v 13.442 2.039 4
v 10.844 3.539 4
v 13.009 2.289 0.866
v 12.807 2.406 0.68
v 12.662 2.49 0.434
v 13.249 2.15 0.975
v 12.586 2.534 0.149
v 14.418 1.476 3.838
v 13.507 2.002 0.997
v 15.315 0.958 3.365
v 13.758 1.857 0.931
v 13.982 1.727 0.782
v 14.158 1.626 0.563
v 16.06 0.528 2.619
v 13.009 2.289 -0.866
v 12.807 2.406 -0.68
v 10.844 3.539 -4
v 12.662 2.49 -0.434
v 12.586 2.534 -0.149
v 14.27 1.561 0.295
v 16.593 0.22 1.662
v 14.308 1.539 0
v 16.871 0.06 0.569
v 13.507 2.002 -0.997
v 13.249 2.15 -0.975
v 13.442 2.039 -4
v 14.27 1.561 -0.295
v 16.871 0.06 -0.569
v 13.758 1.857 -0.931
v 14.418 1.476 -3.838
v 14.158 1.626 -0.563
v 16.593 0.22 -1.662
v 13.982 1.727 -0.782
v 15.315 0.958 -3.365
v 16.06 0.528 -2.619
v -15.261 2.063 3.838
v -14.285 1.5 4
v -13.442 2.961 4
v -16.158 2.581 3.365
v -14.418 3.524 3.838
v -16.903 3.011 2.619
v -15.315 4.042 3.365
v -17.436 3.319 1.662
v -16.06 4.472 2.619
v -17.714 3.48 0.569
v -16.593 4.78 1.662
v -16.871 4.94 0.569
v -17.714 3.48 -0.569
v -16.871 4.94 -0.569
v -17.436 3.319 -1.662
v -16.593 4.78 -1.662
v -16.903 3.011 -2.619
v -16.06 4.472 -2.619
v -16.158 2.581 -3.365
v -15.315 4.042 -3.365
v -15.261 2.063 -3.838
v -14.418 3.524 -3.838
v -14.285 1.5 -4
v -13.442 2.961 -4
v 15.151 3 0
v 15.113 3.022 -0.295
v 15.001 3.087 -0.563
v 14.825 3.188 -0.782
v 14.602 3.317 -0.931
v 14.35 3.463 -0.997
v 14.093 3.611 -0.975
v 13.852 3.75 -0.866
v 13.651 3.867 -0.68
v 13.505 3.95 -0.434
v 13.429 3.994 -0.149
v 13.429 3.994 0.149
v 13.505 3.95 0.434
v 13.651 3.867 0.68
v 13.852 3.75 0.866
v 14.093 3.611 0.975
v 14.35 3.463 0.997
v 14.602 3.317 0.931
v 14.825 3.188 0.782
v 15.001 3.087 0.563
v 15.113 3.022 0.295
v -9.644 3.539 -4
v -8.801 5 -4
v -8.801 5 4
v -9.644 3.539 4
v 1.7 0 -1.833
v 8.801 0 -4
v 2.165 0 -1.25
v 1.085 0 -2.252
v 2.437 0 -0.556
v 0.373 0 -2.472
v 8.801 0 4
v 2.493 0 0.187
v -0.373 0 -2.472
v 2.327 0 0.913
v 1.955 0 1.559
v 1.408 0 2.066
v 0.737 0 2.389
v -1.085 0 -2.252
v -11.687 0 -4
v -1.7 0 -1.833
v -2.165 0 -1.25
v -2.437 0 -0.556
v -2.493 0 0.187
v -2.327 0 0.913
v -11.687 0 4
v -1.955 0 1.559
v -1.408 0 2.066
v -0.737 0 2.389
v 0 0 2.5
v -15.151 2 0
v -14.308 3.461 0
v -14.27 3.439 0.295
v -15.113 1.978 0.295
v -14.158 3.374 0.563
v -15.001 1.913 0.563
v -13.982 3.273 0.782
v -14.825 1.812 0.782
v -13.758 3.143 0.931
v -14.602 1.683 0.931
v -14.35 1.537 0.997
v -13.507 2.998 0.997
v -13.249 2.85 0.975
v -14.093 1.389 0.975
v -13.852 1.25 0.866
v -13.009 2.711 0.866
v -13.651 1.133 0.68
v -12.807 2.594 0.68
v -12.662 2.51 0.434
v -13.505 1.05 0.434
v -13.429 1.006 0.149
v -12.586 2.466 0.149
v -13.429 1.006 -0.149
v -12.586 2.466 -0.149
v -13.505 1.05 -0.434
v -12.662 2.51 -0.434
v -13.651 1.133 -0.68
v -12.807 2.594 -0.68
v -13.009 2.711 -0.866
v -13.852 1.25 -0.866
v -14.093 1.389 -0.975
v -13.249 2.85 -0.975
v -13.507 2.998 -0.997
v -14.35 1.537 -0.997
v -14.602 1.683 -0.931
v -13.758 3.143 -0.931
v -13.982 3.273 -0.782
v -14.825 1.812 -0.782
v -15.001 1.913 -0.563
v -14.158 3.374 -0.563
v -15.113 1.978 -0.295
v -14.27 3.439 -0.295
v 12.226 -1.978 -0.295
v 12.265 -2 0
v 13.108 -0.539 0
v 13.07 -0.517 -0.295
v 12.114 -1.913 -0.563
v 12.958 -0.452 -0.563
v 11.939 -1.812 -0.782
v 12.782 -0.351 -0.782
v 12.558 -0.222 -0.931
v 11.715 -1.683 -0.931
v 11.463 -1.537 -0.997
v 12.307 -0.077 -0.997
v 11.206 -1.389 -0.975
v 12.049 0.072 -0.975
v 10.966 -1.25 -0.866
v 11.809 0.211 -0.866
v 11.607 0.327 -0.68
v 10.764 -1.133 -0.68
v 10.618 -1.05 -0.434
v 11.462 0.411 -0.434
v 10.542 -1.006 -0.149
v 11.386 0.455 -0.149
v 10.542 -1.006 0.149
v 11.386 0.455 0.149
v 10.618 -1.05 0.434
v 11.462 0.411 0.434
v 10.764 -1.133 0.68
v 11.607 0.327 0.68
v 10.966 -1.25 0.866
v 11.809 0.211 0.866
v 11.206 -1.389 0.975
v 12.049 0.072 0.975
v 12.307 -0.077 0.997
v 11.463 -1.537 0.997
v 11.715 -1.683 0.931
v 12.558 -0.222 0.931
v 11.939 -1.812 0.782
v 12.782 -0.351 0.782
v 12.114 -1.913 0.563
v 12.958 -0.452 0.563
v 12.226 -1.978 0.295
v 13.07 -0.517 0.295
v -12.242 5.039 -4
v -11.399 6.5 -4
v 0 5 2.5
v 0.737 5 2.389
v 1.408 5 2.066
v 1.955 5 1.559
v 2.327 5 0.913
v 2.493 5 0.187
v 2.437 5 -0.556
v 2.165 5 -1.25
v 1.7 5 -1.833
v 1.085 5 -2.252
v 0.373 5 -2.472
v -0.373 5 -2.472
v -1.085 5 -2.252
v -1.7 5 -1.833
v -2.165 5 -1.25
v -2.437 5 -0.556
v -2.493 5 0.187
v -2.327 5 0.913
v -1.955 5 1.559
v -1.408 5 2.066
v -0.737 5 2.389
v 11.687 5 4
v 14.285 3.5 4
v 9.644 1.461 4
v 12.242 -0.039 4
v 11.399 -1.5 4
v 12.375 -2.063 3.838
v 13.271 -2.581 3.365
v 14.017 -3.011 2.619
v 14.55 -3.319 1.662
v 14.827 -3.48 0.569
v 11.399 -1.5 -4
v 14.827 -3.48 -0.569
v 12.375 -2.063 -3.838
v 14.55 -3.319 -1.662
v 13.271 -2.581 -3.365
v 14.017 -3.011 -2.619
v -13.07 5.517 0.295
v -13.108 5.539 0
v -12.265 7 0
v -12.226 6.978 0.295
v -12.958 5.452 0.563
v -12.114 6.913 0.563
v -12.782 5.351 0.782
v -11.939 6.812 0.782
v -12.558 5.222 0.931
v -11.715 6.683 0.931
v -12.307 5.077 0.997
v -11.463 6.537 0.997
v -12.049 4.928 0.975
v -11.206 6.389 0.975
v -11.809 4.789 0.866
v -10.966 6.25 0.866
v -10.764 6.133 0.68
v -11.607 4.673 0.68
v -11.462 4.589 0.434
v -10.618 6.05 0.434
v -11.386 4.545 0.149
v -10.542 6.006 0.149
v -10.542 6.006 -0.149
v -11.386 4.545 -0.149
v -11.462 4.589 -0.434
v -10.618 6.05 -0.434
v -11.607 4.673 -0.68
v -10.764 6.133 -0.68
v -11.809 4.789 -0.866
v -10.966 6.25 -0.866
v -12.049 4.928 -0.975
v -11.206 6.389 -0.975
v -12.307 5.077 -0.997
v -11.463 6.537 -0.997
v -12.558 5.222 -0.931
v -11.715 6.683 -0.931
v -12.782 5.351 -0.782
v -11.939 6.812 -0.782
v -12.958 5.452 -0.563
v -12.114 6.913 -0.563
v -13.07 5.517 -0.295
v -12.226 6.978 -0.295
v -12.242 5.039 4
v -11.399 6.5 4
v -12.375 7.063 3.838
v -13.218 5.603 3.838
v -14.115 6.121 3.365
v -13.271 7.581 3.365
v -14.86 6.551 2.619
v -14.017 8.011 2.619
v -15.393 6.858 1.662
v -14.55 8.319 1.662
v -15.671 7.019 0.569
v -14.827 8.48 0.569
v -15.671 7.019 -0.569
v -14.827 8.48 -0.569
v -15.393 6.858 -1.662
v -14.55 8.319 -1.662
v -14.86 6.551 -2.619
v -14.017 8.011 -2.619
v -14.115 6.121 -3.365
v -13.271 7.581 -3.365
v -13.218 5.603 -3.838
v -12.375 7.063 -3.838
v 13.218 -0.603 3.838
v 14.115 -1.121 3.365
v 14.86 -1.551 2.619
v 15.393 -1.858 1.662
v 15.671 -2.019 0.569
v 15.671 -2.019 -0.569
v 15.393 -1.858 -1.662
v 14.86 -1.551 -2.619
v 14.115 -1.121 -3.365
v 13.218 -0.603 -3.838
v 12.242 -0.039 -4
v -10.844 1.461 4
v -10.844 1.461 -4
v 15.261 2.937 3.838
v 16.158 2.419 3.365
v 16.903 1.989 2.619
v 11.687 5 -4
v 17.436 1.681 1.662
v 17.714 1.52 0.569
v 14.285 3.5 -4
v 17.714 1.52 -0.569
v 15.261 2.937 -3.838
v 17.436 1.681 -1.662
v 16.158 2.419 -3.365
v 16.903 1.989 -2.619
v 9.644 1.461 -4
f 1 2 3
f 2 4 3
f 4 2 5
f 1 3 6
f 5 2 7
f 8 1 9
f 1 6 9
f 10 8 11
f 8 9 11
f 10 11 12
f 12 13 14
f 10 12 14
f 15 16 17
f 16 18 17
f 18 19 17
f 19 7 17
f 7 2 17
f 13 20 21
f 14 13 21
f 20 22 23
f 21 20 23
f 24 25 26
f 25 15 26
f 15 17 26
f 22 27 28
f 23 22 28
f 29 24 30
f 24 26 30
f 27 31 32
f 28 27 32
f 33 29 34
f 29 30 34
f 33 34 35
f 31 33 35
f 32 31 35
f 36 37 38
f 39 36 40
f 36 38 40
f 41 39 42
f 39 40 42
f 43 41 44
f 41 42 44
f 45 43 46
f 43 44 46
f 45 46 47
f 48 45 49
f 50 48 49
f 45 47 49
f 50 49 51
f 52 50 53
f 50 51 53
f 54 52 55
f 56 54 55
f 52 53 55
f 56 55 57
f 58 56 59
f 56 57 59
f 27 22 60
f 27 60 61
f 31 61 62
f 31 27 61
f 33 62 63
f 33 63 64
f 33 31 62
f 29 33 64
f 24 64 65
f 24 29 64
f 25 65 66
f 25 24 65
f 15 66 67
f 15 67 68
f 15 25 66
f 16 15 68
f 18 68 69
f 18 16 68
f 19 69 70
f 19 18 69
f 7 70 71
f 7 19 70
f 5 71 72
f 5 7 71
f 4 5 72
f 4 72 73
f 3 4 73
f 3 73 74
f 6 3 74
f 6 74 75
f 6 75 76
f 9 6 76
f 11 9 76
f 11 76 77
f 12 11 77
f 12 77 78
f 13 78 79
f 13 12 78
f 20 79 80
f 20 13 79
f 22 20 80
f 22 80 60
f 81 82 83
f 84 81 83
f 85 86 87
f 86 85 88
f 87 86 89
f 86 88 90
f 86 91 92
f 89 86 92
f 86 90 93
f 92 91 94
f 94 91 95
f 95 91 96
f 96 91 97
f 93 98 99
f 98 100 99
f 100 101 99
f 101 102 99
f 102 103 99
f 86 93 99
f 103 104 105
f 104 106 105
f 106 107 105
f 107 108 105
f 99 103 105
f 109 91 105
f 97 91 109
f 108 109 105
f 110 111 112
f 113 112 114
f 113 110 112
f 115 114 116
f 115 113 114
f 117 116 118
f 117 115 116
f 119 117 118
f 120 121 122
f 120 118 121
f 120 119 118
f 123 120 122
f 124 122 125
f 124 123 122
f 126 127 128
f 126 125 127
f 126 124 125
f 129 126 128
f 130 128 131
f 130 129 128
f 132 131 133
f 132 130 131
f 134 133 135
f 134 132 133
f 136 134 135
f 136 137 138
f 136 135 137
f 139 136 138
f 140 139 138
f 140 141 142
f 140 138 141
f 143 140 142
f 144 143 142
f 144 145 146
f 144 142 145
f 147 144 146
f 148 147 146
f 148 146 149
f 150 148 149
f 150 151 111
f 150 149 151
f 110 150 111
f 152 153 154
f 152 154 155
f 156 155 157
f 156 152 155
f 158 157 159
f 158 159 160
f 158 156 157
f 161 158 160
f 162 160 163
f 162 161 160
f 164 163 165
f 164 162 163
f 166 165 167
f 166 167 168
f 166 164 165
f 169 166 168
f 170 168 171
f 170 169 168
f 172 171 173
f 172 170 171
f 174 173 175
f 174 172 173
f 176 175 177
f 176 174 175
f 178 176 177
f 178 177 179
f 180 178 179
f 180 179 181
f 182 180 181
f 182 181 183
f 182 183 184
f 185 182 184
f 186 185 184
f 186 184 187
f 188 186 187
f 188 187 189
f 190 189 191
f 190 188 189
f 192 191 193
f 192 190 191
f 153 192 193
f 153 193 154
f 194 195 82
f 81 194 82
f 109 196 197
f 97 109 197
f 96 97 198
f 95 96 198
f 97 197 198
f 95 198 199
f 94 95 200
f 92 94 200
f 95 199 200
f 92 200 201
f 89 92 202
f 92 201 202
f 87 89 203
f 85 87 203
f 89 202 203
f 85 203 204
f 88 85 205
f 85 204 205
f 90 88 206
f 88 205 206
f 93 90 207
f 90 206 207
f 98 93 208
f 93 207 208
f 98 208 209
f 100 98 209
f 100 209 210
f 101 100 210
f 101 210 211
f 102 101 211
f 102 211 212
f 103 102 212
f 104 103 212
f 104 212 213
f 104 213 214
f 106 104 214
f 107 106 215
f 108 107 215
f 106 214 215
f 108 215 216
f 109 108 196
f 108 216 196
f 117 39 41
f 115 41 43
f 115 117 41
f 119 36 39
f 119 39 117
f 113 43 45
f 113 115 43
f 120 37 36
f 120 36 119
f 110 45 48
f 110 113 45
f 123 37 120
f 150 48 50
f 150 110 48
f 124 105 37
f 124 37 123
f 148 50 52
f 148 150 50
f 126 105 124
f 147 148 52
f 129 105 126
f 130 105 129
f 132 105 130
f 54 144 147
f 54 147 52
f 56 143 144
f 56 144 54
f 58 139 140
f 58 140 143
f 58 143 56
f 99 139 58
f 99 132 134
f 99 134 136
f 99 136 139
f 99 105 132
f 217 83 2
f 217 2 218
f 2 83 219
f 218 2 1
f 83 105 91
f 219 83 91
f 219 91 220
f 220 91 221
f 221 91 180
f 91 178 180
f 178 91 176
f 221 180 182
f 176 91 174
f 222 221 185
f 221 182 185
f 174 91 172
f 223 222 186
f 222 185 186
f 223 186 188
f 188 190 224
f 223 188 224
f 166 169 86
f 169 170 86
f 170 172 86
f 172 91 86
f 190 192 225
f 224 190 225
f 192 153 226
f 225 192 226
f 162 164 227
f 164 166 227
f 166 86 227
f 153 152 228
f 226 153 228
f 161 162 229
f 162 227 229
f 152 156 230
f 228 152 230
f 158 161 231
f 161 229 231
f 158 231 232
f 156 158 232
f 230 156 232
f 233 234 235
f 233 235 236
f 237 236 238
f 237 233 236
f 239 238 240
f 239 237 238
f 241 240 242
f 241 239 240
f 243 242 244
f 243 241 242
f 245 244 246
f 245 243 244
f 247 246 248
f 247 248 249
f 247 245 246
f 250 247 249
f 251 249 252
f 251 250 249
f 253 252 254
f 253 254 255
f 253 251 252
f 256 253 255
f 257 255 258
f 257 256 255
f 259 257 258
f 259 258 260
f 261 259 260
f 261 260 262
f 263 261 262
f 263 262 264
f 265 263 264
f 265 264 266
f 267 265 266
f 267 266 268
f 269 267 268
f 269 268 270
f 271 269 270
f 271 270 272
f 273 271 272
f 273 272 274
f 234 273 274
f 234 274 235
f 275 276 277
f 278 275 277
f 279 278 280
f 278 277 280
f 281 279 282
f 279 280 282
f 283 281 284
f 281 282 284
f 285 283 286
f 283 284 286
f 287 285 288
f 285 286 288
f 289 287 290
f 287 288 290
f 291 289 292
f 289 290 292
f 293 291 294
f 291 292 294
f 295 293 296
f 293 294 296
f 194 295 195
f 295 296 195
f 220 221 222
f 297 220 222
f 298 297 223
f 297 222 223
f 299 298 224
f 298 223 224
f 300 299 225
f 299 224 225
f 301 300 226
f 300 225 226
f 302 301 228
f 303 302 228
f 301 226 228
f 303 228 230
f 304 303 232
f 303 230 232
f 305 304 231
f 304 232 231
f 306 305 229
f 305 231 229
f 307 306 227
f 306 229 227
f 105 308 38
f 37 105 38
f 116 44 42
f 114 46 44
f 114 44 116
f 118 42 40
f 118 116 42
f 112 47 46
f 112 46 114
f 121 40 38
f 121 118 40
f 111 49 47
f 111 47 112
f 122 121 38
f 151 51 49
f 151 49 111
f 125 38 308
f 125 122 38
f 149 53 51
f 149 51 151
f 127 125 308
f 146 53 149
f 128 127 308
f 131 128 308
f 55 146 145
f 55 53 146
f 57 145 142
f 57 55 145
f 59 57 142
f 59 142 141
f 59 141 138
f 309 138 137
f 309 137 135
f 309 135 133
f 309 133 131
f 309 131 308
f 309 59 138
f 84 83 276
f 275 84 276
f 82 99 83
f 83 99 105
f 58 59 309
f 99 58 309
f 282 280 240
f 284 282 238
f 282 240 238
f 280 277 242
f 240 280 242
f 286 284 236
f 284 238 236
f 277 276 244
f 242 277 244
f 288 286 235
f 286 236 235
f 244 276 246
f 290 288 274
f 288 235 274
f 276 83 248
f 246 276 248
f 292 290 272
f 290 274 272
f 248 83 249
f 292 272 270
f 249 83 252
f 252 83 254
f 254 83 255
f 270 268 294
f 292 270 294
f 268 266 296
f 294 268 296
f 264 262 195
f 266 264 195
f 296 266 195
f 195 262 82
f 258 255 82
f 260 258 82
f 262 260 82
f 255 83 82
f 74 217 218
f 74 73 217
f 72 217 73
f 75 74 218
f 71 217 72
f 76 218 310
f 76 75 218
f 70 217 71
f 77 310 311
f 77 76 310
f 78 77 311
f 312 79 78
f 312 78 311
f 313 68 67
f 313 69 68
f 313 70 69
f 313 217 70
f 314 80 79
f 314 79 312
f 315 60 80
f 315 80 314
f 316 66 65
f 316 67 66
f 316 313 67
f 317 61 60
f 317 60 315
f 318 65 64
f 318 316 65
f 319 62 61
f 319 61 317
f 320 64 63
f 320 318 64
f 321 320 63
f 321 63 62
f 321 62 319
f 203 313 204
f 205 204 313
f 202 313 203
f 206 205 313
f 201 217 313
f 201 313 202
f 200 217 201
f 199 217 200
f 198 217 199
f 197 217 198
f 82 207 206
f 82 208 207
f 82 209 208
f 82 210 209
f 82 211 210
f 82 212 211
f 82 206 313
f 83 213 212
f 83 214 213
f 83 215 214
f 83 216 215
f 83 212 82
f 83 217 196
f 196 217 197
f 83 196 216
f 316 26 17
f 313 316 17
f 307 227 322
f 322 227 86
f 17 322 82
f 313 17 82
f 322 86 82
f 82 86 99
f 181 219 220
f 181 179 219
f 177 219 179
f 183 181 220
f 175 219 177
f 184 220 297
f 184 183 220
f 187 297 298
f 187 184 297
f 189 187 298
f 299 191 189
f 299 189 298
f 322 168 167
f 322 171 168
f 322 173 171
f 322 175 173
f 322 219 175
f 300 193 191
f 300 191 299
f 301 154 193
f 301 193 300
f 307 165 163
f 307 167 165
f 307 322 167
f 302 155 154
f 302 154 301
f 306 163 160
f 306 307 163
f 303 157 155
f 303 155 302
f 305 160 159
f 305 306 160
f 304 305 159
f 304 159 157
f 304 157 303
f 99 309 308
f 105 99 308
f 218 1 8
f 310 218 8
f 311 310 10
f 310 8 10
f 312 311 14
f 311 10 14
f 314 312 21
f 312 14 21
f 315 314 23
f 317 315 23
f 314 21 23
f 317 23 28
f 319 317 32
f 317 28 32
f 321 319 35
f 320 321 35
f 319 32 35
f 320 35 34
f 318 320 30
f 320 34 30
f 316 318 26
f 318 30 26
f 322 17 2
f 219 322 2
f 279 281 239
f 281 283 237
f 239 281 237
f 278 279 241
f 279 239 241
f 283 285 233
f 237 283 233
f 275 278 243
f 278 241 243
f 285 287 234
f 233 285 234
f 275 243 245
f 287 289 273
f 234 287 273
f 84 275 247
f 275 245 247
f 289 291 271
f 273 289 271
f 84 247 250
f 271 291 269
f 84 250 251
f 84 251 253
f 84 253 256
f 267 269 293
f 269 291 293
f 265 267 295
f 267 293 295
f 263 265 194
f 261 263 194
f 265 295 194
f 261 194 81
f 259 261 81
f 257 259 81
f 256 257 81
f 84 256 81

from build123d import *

# Parameters (mm, degrees)
SKETCH_2_R                     = 6
EXTRUDE_1_DEPTH                = 5
SKETCH_3_R                     = 2.5
CUT_EXTRUDE_1_DEPTH            = 5
SKETCH_4_W                     = 8.617209121
SKETCH_4_H                     = 5
EXTRUDE_2_DEPTH                = 4
SKETCH_5_W                     = 17.690730237
SKETCH_5_H                     = 8.258947269
CUT_EXTRUDE_3_DEPTH            = 4.5
EXTRUDE_3_DEPTH                = 5.773503
CUT_EXTRUDE_START              = -5.773503
SKETCH_7_R                     = 1
CUT_EXTRUDE_4_DEPTH            = 5.773503
SKETCH_9_W                     = 22.757935056
SKETCH_9_H                     = 15.650140619
CUT_EXTRUDE_5_DEPTH            = 1.2
PATTERN_CIRCULAR_3_COUNT       = 2
PATTERN_START                  = 4.400276835
PATTERN_CIRCULAR_4_OUTLINE_R   = 1
PATTERN_CIRCULAR_4_DEPTH       = 1.686751346
PATTERN_START_2                = 8.487028181
PATTERN_CIRCULAR_4_2_OUTLINE_R = 1
PATTERN_CIRCULAR_4_2_DEPTH     = 1.686751346
SKETCH_10_W                    = 9.588589767
SKETCH_10_H                    = 4.25680111
SKETCH_10_W_2                  = 8.94427191
SKETCH_10_H_2                  = 4.682372666
CUT_EXTRUDE_6_DEPTH            = 10


# Read off the part's stored shape, not the designer's step: 阵列(圆周)4
with BuildPart() as part:
    # 草图2 → 凸台-拉伸1 (new body)
    with BuildSketch(Plane(origin=(0, 0, 0), x_dir=(1, 0, 0), z_dir=(0, 1, 0))):
        with Locations(Location((0, 0, 0), (0, 0, 270))):
            Circle(SKETCH_2_R)
    extrude(amount=EXTRUDE_1_DEPTH)

    # 草图3 → 切除-拉伸1 (cut)
    with BuildSketch(Plane(origin=(0, 5, 0), x_dir=(1, 0, 0), z_dir=(0, 1, 0))):
        with Locations(Location((0, 0, 0), (0, 0, 270))):
            Circle(SKETCH_3_R)
    extrude(amount=-CUT_EXTRUDE_1_DEPTH, mode=Mode.SUBTRACT)

    # 草图4 → 凸台-拉伸2 (add, symmetric)
    with BuildSketch(Plane.XY):
        with Locations((-7.378700456, 2.5)):
            Rectangle(SKETCH_4_W, SKETCH_4_H)
    extrude_2 = extrude(amount=EXTRUDE_2_DEPTH, both=True)

    # 草图5 → 切除-拉伸3 (cut)
    with BuildSketch(Plane(origin=(-8.765478763, 5.060751523, 0), x_dir=(0, 0, 1), z_dir=(0.8660254037844398, -0.499999999999998, 0))):
        with Locations((1.152187915, 4.129473635)):
            Rectangle(SKETCH_5_W, SKETCH_5_H)
    cut_extrude_3 = extrude(amount=-CUT_EXTRUDE_3_DEPTH, mode=Mode.SUBTRACT)

    # 镜向1: 凸台-拉伸2 across plane
    add(extrude_2.mirror(Plane(origin=(0, 0, 0), x_dir=(0, 0, 1), z_dir=(1, 0, 0))))

    # 阵列(圆周)3: 切除-拉伸3 ×2 about axis
    pattern_circular_3_axis = Axis((0, 2.5, -9.079549455), (0, 0, 1))
    for i in range(1, PATTERN_CIRCULAR_3_COUNT):
        add(cut_extrude_3.rotate(pattern_circular_3_axis, i * 360 / PATTERN_CIRCULAR_3_COUNT), mode=Mode.SUBTRACT)

    # 阵列(圆周)4 outline → 阵列(圆周)4 (add)
    with BuildSketch(Plane(origin=(0, 0, 0), x_dir=(0.8660254037844398, -0.499999999999998, 0), z_dir=(0.49999999999999795, 0.8660254037844399, 0)).offset(PATTERN_START)):
        with BuildLine():
            Line((10.621503046, 4), (7.621503046, 4))
            Line((7.621503046, 4), (7.621503046, -4))
            Line((7.621503046, -4), (10.621503046, -4))
            ThreePointArc((10.621503046, -4), (14.621503046, 0), (10.621503046, 4))
        make_face()
        with Locations((10.621503046, 0)):
            Circle(PATTERN_CIRCULAR_4_OUTLINE_R, mode=Mode.SUBTRACT)
    extrude(amount=PATTERN_CIRCULAR_4_DEPTH)

    # Pattern Circular 4 2 outline → Pattern Circular 4 2 (add)
    with BuildSketch(Plane(origin=(0, 0, 0), x_dir=(0.8660254037844398, -0.499999999999998, 0), z_dir=(0.49999999999999795, 0.8660254037844399, 0)).offset(PATTERN_START_2)):
        with BuildLine():
            Line((10.621503046, 4), (7.621503046, 4))
            Line((7.621503046, 4), (7.621503046, -4))
            Line((7.621503046, -4), (10.621503046, -4))
            ThreePointArc((10.621503046, -4), (14.621503046, 0), (10.621503046, 4))
        make_face()
        with Locations((10.621503046, 0)):
            Circle(PATTERN_CIRCULAR_4_2_OUTLINE_R, mode=Mode.SUBTRACT)
    extrude(amount=PATTERN_CIRCULAR_4_2_DEPTH)

    # 草图10 → 切除-拉伸6 (cut)
    with BuildSketch(Plane(origin=(0, 5, 0), x_dir=(1, 0, 0), z_dir=(0, 1, 0))):
        with Locations((-0.322158928, -6.128400555)):
            Rectangle(SKETCH_10_W, SKETCH_10_H)
        with Locations((0, 6.341186333)):
            Rectangle(SKETCH_10_W_2, SKETCH_10_H_2)
    extrude(amount=-CUT_EXTRUDE_6_DEPTH, mode=Mode.SUBTRACT)


with BuildPart() as body_2:
    # 草图6 → 凸台-拉伸3 (new body)
    with BuildSketch(Plane(origin=(-0.035074908, -0.060751523, 0), x_dir=(0, 0, 1), z_dir=(0.499999999999998, 0.8660254037844398, 0))):
        with BuildLine():
            Line((-4, -13.121503046), (-4, -10.121503046))
            Line((-4, -10.121503046), (4, -10.121503046))
            Line((4, -10.121503046), (4, -13.121503046))
            ThreePointArc((4, -13.121503046), (0, -17.121503046), (-4, -13.121503046))
        make_face()
    extrude(amount=-EXTRUDE_3_DEPTH)

    # 草图7 → 切除-拉伸4 (cut)
    with BuildSketch(Plane(origin=(-0.035074908, -0.060751523, 0), x_dir=(0.8660254037844398, -0.49999999999999806, 0), z_dir=(0.499999999999998, 0.8660254037844397, 0)).offset(CUT_EXTRUDE_START)):
        with Locations(Location((-13.121503046, 0, 0), (0, 0, 180))):
            Circle(SKETCH_7_R)
    extrude(amount=CUT_EXTRUDE_4_DEPTH, mode=Mode.SUBTRACT)

    # 草图9 → 切除-拉伸5 (cut, symmetric)
    with BuildSketch(Plane(origin=(-1.478450581, -2.560751523, 0), x_dir=(0.8660254037844398, -0.49999999999999806, 0), z_dir=(0.499999999999998, 0.8660254037844397, 0))):
        with Locations((-20.577581029, 0.471972115)):
            Rectangle(SKETCH_9_W, SKETCH_9_H)
    extrude(amount=CUT_EXTRUDE_5_DEPTH, both=True, mode=Mode.SUBTRACT)


with BuildPart() as cut_extrude_5_piece_1:
    # of the separate pieces the step leaves, piece 1, a body of its own (cut_extrude_5_pieces)
    add(body_2.part.solids().sort_by_distance((-10.843929344, 1.460769515, -4))[0])


with BuildPart() as cut_extrude_5_piece_2:
    # of the separate pieces the step leaves, piece 2, a body of its own (cut_extrude_5_pieces)
    add(body_2.part.solids().sort_by_distance((-11.398629882, 6.5, -4))[0])


solid = Compound([part.part, cut_extrude_5_piece_1.part, cut_extrude_5_piece_2.part])
